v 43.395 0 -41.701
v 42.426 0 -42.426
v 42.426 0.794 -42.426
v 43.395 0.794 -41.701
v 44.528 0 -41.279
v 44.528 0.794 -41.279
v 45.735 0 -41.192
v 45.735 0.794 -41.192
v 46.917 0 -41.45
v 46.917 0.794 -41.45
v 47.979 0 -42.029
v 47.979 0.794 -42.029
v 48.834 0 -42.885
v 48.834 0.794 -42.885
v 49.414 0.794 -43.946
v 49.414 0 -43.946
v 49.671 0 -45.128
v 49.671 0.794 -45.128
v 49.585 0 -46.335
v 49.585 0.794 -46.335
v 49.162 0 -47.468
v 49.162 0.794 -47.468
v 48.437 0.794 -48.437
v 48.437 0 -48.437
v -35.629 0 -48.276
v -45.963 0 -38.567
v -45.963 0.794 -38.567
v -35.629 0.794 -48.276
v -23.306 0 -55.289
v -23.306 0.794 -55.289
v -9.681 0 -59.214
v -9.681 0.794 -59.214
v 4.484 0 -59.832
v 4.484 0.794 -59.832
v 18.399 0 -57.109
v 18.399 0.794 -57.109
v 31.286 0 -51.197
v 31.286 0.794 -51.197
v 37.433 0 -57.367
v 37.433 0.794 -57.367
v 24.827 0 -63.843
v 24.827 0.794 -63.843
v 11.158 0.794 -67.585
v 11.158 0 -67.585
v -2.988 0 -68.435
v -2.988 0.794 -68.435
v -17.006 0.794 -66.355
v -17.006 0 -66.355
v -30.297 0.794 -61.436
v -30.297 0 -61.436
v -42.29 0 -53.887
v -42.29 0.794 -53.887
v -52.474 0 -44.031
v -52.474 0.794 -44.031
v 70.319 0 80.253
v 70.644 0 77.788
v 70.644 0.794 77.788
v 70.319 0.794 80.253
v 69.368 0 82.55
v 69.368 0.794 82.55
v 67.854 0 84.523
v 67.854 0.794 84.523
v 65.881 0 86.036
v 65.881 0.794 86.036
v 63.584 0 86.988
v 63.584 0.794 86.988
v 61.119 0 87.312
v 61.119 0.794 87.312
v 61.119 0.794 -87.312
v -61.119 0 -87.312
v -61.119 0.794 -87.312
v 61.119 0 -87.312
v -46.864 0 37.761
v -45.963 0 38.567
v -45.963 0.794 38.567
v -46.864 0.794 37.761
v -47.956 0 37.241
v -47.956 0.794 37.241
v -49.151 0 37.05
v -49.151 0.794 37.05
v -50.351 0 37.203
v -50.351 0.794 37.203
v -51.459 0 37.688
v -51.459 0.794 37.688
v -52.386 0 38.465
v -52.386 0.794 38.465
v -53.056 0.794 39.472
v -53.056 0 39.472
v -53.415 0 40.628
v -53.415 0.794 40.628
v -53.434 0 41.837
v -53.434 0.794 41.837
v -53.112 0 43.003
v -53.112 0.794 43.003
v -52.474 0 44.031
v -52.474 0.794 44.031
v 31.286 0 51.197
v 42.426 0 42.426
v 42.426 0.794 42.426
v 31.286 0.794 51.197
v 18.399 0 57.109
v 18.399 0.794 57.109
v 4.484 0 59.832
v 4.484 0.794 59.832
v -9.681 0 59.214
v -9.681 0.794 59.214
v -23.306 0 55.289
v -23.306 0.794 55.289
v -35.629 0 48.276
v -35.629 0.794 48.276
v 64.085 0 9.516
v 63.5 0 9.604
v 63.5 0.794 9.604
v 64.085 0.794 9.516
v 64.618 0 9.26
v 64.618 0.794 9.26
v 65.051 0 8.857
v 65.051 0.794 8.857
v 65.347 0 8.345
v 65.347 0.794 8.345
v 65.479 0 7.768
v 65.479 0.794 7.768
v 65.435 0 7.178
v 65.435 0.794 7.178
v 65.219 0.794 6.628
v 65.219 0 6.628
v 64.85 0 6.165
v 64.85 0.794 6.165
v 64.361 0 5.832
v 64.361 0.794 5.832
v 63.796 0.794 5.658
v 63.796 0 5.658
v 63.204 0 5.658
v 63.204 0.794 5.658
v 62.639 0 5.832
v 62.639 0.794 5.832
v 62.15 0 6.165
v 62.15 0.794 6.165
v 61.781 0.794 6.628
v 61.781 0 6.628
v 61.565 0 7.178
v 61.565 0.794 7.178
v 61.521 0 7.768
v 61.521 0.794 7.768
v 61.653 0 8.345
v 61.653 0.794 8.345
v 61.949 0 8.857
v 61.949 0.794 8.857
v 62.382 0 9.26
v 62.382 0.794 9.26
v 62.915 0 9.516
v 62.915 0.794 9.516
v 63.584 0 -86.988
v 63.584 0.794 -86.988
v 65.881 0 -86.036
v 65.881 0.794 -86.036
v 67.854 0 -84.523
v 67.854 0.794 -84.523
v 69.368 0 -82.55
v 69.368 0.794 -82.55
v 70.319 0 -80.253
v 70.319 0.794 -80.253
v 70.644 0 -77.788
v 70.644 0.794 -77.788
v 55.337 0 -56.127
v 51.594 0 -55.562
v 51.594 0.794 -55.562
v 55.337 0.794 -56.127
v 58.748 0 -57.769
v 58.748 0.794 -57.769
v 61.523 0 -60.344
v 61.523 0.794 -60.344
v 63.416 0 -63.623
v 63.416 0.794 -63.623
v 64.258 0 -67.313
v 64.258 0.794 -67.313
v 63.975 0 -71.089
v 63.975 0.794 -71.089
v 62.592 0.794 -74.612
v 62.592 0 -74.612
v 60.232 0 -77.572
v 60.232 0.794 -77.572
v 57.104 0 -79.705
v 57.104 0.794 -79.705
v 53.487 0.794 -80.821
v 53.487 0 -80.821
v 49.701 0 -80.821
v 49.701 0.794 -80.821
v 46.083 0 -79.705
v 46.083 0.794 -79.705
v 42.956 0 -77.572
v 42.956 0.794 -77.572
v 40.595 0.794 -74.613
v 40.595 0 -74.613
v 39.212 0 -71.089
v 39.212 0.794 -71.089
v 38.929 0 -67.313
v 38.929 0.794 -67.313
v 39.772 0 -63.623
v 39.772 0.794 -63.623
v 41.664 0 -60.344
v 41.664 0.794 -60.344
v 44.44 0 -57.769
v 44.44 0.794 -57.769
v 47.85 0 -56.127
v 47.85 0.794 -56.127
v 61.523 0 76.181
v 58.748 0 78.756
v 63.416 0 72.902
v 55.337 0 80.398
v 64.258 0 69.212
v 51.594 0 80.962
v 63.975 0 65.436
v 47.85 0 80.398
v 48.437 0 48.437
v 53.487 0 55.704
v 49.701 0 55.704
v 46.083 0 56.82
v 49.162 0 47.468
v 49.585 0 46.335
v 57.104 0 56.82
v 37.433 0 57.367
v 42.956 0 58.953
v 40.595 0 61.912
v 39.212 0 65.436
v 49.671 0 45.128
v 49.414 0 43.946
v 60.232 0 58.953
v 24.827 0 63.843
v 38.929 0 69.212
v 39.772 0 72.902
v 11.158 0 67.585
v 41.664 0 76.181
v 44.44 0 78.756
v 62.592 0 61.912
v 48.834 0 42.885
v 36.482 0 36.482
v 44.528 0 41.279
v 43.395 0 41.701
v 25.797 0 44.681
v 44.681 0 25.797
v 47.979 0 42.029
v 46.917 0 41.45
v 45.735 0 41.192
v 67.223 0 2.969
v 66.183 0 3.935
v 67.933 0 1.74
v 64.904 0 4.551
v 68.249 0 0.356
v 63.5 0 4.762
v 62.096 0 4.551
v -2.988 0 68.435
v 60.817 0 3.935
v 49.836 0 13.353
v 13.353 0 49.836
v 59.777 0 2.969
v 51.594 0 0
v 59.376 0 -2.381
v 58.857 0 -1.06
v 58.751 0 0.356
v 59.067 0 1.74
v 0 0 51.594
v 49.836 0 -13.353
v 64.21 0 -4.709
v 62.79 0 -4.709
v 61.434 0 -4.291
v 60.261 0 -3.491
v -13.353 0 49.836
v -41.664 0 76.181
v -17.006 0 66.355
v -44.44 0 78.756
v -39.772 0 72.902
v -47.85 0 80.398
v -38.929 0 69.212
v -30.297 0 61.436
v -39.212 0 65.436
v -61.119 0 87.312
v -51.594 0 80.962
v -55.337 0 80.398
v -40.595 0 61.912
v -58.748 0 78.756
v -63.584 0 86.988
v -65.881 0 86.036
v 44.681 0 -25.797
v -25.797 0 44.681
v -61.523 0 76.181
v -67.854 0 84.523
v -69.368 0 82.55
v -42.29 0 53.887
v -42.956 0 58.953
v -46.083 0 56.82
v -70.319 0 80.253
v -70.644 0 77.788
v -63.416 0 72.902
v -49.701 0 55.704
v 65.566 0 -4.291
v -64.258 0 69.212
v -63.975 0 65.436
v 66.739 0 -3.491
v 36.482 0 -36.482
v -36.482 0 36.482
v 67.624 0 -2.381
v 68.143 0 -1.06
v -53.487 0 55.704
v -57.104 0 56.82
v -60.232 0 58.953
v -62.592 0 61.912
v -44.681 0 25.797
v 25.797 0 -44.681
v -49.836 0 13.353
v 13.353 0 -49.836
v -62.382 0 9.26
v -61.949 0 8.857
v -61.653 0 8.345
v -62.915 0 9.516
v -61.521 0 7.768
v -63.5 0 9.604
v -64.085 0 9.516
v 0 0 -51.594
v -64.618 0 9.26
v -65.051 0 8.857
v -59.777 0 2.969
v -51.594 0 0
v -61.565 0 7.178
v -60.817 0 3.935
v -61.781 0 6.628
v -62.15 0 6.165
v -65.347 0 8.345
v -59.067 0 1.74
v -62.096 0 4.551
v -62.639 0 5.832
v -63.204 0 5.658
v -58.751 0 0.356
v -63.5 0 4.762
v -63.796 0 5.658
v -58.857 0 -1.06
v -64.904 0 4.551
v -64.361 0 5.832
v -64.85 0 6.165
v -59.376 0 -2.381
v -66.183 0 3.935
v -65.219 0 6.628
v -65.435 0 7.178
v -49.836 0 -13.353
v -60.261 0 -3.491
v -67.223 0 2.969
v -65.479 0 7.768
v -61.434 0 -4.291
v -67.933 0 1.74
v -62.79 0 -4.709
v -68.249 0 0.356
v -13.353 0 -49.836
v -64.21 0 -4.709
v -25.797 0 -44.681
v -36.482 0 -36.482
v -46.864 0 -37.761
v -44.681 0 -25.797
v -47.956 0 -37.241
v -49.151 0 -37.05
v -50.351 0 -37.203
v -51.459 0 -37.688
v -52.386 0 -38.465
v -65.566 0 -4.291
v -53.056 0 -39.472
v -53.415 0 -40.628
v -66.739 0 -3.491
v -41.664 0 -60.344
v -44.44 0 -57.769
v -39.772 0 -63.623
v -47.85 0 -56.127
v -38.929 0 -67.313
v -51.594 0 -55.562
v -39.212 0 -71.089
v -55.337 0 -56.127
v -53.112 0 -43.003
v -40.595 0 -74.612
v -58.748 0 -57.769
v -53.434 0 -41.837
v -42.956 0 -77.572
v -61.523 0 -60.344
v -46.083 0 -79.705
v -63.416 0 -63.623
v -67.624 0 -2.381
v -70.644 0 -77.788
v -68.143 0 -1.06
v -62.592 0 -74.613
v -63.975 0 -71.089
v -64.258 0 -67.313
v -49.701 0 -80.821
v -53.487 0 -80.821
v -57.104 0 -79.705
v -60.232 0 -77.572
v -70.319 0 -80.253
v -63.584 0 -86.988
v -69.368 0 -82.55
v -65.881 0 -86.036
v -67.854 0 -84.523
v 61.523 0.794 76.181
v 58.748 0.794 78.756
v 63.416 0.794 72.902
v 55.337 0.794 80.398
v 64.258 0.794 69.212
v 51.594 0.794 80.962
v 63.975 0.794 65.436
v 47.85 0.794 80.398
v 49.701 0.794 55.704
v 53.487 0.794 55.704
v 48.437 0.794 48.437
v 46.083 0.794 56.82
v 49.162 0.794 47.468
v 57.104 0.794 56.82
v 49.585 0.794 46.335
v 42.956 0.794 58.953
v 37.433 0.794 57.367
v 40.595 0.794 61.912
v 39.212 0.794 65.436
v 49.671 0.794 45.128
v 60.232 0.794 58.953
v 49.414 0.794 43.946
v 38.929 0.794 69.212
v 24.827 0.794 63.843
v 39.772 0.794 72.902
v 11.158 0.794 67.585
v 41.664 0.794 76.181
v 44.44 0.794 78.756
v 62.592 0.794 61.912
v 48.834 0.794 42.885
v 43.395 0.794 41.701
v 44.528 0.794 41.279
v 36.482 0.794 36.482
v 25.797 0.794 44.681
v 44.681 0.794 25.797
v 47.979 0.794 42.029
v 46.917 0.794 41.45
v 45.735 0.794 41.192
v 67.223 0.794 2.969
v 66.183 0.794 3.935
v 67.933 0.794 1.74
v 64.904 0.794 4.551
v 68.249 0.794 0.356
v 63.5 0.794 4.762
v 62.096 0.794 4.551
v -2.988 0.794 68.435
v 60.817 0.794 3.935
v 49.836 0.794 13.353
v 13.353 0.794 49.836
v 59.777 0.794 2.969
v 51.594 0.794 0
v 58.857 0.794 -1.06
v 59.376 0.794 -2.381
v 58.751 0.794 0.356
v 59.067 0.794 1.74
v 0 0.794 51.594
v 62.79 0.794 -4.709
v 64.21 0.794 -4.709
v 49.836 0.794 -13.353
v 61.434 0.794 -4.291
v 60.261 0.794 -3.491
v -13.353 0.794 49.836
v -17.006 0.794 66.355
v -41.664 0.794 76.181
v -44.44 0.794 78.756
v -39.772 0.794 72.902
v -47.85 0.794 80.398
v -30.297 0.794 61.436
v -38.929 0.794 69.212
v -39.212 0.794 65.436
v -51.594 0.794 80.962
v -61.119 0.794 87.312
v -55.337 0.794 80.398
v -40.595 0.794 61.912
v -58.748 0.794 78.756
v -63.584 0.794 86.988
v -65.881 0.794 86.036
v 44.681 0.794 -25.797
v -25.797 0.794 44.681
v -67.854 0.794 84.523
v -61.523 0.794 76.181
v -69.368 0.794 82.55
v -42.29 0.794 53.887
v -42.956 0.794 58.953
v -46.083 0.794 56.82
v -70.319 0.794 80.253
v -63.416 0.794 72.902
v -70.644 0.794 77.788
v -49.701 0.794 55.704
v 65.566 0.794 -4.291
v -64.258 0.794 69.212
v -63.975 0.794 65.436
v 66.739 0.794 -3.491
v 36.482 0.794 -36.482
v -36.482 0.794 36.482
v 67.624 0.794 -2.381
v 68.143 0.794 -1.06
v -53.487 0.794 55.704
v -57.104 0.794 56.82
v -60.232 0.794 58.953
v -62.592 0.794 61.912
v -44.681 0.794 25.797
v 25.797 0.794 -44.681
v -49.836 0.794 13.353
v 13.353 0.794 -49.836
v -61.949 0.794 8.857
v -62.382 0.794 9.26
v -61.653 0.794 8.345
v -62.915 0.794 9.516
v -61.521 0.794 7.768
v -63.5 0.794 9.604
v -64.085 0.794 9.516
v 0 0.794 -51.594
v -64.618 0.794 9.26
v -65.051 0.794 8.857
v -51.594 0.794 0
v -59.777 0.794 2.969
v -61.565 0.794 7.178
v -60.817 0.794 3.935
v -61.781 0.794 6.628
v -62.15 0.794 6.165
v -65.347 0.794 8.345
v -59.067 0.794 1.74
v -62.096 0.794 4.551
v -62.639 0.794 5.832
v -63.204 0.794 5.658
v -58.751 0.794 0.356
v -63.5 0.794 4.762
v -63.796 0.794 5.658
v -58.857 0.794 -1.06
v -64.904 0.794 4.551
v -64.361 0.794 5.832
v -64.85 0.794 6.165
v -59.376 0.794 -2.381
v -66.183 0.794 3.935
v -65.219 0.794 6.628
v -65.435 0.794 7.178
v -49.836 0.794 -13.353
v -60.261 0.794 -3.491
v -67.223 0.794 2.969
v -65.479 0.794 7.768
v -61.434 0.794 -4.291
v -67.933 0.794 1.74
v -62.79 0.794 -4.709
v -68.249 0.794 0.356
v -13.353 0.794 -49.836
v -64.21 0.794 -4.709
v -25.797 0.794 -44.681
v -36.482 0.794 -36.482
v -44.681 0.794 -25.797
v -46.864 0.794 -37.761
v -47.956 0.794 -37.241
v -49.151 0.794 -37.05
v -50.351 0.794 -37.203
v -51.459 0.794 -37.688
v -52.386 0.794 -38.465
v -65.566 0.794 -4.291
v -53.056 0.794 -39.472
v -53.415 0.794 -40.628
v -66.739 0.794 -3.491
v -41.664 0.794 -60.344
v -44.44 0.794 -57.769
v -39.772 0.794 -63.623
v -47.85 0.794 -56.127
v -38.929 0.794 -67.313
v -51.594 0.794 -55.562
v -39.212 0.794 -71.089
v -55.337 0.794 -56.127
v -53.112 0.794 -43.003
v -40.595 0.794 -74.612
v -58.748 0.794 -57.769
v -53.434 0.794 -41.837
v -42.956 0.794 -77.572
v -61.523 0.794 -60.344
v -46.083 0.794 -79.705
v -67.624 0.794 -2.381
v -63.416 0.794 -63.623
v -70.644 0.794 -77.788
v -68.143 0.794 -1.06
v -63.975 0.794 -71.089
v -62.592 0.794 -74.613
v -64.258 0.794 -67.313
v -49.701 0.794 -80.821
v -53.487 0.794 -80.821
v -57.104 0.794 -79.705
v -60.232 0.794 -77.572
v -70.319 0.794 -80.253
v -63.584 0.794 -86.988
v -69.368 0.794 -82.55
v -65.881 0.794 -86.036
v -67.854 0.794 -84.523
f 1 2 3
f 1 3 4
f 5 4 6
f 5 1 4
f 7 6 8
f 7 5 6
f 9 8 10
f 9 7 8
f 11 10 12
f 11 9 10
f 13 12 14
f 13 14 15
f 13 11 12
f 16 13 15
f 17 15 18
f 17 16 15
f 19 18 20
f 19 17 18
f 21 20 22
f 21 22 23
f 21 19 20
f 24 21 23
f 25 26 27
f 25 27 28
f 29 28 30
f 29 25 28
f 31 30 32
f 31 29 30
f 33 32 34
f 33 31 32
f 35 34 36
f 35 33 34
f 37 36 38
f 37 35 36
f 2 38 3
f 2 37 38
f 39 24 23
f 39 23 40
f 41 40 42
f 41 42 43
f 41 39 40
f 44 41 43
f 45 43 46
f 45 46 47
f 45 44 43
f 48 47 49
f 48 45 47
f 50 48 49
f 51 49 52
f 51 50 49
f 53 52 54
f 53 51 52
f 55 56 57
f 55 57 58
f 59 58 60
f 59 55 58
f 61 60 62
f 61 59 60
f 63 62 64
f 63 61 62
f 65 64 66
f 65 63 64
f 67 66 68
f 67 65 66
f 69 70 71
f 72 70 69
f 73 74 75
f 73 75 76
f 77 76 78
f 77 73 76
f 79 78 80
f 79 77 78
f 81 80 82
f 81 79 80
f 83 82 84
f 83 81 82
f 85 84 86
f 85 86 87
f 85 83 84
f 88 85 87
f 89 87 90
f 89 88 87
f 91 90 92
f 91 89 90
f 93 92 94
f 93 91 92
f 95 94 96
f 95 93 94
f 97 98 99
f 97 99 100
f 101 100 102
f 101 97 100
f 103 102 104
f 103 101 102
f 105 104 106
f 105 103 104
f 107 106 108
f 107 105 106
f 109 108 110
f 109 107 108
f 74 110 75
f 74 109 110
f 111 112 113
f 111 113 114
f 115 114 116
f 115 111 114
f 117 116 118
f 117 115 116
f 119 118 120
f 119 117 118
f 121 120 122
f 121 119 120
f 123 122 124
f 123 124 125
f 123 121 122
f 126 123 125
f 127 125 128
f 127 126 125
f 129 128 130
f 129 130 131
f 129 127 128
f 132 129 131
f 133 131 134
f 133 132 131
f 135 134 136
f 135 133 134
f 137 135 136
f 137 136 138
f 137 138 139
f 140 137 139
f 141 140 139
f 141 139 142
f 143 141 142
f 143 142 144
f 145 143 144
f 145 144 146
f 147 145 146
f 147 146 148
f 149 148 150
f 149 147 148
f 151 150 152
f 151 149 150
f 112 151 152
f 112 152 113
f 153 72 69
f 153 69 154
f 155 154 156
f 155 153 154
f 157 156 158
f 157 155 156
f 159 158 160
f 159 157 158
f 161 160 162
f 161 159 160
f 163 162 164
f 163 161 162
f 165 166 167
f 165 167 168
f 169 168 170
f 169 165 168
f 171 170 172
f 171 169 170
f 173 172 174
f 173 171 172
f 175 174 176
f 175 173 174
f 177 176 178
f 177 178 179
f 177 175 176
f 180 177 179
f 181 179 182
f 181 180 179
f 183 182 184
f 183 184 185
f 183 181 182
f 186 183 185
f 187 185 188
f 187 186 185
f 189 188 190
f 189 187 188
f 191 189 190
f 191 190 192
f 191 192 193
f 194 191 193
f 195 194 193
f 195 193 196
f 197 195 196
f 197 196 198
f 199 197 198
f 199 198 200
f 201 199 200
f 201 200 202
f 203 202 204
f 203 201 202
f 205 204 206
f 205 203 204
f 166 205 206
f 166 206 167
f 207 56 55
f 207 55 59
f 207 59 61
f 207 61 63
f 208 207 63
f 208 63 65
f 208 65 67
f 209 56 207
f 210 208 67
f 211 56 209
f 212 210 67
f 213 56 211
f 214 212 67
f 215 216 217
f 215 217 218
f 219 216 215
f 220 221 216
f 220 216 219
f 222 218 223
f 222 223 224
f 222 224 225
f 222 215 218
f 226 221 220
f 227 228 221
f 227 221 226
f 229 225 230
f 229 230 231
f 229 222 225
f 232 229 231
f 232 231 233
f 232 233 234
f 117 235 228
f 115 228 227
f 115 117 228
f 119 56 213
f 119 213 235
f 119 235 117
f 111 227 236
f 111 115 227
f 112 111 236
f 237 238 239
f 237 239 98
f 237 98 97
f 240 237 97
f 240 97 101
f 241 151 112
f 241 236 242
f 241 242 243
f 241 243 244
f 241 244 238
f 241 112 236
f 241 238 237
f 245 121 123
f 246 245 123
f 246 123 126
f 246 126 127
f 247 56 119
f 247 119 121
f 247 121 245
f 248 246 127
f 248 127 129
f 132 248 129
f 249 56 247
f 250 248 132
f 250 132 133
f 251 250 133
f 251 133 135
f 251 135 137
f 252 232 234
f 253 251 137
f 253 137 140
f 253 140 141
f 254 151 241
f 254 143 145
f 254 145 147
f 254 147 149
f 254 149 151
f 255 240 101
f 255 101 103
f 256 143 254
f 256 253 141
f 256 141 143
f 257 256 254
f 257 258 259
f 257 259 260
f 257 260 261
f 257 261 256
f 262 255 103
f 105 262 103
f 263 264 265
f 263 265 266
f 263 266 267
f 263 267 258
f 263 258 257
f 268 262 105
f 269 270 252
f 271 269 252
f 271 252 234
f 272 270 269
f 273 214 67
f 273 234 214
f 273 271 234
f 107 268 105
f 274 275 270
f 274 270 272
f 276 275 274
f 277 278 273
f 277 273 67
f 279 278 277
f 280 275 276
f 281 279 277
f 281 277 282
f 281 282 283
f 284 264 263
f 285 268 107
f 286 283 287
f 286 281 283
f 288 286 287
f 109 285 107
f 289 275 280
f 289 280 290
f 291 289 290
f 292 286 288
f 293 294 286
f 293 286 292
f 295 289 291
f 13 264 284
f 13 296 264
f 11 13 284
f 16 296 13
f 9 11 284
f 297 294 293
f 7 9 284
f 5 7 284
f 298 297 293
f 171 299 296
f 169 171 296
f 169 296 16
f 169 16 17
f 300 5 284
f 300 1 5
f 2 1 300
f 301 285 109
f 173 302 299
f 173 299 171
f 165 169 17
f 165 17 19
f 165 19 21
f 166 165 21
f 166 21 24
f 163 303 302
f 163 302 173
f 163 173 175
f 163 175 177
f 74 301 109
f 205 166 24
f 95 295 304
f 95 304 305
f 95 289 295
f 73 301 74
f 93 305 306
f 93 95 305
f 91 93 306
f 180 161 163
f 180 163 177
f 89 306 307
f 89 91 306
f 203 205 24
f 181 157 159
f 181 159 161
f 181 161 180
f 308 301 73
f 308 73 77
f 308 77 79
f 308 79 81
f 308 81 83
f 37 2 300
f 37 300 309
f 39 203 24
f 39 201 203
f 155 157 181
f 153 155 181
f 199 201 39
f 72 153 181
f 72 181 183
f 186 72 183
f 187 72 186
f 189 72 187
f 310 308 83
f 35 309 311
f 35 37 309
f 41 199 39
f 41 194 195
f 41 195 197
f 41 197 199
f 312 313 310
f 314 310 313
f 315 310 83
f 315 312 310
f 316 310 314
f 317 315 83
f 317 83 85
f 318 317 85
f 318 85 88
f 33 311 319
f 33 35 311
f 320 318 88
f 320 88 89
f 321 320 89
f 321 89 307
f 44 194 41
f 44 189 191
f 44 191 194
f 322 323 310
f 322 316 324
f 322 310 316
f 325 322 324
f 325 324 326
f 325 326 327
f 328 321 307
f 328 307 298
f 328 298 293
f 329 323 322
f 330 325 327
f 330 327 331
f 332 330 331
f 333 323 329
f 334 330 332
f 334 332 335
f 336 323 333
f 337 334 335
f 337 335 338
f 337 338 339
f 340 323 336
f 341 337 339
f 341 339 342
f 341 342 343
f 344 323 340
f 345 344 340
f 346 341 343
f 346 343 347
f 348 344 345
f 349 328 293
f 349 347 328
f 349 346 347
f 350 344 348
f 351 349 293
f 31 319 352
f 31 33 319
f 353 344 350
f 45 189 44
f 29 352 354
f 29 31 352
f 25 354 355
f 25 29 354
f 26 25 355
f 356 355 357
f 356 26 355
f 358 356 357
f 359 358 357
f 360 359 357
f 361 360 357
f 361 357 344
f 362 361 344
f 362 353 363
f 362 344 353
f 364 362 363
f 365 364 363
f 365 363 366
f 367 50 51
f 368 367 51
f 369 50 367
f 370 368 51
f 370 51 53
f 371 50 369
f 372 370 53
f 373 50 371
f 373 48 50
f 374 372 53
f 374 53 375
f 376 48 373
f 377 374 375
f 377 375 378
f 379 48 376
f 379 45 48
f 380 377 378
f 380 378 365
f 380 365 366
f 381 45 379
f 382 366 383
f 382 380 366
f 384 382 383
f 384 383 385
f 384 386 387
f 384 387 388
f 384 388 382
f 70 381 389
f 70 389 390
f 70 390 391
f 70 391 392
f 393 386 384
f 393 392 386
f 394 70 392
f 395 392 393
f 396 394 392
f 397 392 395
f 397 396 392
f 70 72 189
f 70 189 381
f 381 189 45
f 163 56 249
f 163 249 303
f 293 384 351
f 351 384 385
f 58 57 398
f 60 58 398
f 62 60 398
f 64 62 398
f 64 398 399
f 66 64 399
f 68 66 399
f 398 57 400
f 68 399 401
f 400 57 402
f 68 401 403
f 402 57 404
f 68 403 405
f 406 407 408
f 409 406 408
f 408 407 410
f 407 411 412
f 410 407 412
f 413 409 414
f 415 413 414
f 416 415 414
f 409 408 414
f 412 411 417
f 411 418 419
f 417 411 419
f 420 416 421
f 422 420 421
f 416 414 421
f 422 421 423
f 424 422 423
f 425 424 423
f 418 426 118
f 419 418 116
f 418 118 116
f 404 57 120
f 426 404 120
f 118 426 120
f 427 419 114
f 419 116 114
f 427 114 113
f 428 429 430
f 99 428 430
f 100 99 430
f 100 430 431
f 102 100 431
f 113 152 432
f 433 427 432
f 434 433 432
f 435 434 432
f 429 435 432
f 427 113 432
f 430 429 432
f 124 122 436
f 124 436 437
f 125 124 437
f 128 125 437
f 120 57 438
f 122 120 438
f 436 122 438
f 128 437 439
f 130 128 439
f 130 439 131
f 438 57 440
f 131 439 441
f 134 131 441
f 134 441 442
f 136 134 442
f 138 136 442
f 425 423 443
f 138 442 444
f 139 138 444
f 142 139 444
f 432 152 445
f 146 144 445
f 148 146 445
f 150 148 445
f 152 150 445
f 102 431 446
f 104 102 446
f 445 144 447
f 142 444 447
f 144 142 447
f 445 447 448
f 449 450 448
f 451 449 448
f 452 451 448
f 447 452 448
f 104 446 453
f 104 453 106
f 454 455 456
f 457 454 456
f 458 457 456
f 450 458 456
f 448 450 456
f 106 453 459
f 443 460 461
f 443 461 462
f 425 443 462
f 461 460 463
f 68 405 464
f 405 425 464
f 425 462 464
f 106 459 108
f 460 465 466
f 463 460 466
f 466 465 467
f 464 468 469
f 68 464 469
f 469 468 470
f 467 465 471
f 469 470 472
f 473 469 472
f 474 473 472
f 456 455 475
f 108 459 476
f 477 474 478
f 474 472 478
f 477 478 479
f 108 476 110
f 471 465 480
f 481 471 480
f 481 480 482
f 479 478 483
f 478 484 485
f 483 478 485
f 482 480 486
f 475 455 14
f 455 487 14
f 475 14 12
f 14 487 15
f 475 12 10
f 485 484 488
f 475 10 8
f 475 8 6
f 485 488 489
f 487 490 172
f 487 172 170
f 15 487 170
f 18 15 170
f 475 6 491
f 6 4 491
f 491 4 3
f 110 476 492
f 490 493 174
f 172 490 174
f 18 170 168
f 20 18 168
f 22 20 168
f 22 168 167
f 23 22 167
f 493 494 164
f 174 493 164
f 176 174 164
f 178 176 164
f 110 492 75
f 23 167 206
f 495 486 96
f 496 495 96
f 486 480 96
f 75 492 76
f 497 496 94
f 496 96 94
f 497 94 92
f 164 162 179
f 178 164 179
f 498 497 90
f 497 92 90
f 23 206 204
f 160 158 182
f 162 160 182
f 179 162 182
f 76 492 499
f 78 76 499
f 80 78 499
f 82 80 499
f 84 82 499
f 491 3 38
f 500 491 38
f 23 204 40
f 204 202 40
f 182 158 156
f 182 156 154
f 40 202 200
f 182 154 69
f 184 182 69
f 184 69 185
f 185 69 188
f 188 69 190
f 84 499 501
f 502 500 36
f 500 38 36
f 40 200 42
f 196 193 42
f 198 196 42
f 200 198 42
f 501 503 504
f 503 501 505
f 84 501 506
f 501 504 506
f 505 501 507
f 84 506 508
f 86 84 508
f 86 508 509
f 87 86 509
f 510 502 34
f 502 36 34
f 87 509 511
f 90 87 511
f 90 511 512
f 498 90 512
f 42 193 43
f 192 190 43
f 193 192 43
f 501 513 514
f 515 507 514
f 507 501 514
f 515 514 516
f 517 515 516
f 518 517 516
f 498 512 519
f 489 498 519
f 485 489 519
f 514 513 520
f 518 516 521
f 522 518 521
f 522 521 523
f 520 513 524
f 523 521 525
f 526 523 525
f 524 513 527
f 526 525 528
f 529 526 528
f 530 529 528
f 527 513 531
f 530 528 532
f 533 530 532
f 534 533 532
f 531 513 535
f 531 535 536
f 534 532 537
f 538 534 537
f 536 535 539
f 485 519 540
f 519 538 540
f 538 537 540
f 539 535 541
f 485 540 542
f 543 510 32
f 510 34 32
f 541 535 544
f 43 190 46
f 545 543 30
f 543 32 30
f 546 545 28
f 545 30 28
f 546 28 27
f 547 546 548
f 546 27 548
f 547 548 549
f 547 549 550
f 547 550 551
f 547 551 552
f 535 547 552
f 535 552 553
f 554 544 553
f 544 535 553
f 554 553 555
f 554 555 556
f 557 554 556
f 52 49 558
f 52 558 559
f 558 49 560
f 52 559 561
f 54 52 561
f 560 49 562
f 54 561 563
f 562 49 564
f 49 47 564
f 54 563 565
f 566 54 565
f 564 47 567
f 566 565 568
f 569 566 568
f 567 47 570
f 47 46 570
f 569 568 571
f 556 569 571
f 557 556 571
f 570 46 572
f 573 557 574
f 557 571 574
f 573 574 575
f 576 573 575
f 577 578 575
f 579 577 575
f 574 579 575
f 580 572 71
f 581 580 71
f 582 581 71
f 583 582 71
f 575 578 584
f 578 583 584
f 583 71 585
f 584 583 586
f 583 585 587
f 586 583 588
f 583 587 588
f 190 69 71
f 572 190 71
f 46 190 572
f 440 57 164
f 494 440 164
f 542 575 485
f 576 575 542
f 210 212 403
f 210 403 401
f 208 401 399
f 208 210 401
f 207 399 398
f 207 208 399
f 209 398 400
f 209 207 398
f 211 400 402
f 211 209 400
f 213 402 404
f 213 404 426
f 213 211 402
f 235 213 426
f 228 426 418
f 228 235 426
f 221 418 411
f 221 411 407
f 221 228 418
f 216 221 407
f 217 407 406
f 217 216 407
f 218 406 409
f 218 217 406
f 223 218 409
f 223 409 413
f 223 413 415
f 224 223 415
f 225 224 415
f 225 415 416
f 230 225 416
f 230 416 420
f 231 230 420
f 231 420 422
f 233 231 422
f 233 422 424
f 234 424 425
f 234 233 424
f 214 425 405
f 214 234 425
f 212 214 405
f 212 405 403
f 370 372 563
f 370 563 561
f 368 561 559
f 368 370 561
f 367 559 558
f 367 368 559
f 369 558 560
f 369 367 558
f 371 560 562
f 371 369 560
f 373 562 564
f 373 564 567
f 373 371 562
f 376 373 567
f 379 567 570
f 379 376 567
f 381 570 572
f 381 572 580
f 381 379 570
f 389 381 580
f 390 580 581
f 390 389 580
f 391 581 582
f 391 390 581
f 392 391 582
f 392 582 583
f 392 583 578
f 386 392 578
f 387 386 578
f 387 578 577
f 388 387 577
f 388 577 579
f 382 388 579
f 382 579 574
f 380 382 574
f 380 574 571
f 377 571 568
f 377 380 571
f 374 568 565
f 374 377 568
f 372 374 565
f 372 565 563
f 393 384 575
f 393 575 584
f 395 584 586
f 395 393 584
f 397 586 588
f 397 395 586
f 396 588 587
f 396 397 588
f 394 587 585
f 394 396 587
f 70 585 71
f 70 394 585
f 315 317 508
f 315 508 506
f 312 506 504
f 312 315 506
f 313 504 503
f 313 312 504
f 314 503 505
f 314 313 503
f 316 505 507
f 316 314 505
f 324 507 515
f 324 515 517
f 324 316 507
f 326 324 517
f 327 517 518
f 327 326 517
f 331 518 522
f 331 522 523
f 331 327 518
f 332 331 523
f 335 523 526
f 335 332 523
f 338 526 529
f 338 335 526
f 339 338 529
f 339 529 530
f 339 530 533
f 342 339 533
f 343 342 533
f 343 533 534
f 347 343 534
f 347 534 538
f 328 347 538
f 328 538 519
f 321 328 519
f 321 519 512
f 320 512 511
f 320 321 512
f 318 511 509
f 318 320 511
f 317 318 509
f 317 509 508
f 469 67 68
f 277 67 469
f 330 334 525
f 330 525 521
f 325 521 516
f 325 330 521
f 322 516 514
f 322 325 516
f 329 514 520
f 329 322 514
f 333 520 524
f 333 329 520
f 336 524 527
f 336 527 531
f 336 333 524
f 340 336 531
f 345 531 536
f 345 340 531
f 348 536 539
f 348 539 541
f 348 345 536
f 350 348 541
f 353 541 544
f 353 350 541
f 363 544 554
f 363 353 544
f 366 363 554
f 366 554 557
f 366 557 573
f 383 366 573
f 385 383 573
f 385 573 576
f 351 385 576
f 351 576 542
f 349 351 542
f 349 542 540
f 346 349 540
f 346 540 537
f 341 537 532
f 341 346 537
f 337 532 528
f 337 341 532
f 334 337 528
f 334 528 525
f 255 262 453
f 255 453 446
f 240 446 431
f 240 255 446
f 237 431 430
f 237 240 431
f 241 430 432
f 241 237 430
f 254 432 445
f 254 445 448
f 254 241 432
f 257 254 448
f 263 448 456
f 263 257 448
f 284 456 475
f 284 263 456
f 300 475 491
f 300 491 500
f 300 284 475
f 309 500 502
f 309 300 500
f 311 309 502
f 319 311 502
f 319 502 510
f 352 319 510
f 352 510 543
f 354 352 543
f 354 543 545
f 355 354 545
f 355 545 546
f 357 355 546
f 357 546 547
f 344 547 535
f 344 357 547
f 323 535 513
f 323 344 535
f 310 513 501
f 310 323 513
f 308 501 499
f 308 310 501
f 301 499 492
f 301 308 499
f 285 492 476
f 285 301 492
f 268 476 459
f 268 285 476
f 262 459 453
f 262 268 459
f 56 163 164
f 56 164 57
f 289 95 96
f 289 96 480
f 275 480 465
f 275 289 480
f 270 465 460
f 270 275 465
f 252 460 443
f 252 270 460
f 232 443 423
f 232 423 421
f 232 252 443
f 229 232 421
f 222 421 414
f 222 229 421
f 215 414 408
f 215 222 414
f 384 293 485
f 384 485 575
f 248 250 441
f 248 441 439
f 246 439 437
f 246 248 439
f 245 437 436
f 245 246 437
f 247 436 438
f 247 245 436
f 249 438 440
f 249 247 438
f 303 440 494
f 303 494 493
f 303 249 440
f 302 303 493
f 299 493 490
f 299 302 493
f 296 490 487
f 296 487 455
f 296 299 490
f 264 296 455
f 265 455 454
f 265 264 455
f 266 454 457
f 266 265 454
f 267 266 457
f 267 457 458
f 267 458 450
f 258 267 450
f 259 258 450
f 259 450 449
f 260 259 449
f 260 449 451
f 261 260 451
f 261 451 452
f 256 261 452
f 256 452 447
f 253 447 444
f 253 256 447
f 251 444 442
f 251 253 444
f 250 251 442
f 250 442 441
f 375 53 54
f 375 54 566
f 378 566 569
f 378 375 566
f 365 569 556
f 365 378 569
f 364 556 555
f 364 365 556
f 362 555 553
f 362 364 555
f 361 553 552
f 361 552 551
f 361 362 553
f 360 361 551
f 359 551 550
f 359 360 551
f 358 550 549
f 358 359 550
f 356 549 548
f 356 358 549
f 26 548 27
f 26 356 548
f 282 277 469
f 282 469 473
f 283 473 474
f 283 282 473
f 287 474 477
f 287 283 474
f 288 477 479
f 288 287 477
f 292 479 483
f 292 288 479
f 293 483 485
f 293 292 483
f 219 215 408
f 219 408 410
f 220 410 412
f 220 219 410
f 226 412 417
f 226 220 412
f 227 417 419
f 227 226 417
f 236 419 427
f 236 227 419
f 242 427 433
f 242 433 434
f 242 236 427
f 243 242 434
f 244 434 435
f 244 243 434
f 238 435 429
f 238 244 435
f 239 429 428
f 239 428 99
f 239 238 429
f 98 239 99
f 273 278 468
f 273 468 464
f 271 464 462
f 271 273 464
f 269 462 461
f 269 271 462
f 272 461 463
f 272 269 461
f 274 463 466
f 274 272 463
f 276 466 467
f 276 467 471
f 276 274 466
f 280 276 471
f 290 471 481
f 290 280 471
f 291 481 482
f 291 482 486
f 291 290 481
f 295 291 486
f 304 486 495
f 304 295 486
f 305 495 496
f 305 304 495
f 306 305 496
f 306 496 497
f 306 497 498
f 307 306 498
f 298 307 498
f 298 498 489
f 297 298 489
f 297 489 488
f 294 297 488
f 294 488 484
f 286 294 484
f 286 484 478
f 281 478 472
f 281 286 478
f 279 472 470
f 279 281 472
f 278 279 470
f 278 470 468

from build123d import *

# Parameters (mm, degrees)
SKETCH1_R           = 12.7
SKETCH1_R_2         = 51.59375
SKETCH1_R_3         = 4.7625
SKETCH1_R_4         = 1.984375
BOSS_EXTRUDE1_DEPTH = 0.79375


with BuildPart() as part:
    # Sketch1 → Boss-Extrude1 (new body)
    with BuildSketch(Plane(origin=(0, 0, 0), x_dir=(1, 0, 0), z_dir=(0, 1, 0))):
        with BuildLine():
            Line((-61.11875, 87.3125), (61.11875, 87.3125))
            ThreePointArc((61.11875, 87.3125), (67.853942091, 84.522692091), (70.64375, 77.7875))
            Line((70.64375, 77.7875), (70.64375, -77.7875))
            ThreePointArc((70.64375, -77.7875), (67.853942091, -84.522692091), (61.11875, -87.3125))
            Line((61.11875, -87.3125), (-61.11875, -87.3125))
            ThreePointArc((-61.11875, -87.3125), (-67.853942091, -84.522692091), (-70.64375, -77.7875))
            Line((-70.64375, -77.7875), (-70.64375, 77.7875))
            ThreePointArc((-70.64375, 77.7875), (-67.853942091, 84.522692091), (-61.11875, 87.3125))
        make_face()
        with Locations(Location((-51.59375, 68.2625, 0), (0, 0, 270))):
            Circle(SKETCH1_R, mode=Mode.SUBTRACT)
        with Locations(Location((51.59375, 68.2625, 0), (0, 0, 270))):
            Circle(SKETCH1_R, mode=Mode.SUBTRACT)
        with Locations(Location((-51.59375, -68.2625, 0), (0, 0, 270))):
            Circle(SKETCH1_R, mode=Mode.SUBTRACT)
        with Locations(Location((51.59375, -68.2625, 0), (0, 0, 270))):
            Circle(SKETCH1_R, mode=Mode.SUBTRACT)
        with Locations(Location((0, 0, 0), (0, 0, 270))):
            Circle(SKETCH1_R_2, mode=Mode.SUBTRACT)
        with Locations(Location((-63.5, 0, 0), (0, 0, 270))):
            Circle(SKETCH1_R_3, mode=Mode.SUBTRACT)
        with Locations(Location((63.5, 0, 0), (0, 0, 270))):
            Circle(SKETCH1_R_3, mode=Mode.SUBTRACT)
        with Locations(Location((-63.5, -7.62, 0), (0, 0, 270))):
            Circle(SKETCH1_R_4, mode=Mode.SUBTRACT)
        with Locations(Location((63.5, -7.62, 0), (0, 0, 270))):
            Circle(SKETCH1_R_4, mode=Mode.SUBTRACT)
        with BuildLine():
            ThreePointArc((-52.47407269, 44.03097504), (-51.950230865, 38.043435583), (-45.962691407, 38.567277408))
            ThreePointArc((-45.962691407, 38.567277408), (-2.617164655, 59.942925664), (42.426429781, 42.426429781))
            ThreePointArc((42.426429781, 42.426429781), (48.436840667, 42.426429781), (48.436840667, 48.436840667))
            ThreePointArc((48.436840667, 48.436840667), (-2.987929648, 68.434840133), (-52.47407269, 44.03097504))
        make_face(mode=Mode.SUBTRACT)
        with BuildLine():
            ThreePointArc((42.426429781, -42.426429781), (-2.617164655, -59.942925664), (-45.962691407, -38.567277408))
            ThreePointArc((-45.962691407, -38.567277408), (-51.950230865, -38.043435583), (-52.47407269, -44.03097504))
            ThreePointArc((-52.47407269, -44.03097504), (-2.987929648, -68.434840133), (48.436840667, -48.436840667))
            ThreePointArc((48.436840667, -48.436840667), (48.436840667, -42.426429781), (42.426429781, -42.426429781))
        make_face(mode=Mode.SUBTRACT)
    extrude(amount=BOSS_EXTRUDE1_DEPTH)


solid = part.part
